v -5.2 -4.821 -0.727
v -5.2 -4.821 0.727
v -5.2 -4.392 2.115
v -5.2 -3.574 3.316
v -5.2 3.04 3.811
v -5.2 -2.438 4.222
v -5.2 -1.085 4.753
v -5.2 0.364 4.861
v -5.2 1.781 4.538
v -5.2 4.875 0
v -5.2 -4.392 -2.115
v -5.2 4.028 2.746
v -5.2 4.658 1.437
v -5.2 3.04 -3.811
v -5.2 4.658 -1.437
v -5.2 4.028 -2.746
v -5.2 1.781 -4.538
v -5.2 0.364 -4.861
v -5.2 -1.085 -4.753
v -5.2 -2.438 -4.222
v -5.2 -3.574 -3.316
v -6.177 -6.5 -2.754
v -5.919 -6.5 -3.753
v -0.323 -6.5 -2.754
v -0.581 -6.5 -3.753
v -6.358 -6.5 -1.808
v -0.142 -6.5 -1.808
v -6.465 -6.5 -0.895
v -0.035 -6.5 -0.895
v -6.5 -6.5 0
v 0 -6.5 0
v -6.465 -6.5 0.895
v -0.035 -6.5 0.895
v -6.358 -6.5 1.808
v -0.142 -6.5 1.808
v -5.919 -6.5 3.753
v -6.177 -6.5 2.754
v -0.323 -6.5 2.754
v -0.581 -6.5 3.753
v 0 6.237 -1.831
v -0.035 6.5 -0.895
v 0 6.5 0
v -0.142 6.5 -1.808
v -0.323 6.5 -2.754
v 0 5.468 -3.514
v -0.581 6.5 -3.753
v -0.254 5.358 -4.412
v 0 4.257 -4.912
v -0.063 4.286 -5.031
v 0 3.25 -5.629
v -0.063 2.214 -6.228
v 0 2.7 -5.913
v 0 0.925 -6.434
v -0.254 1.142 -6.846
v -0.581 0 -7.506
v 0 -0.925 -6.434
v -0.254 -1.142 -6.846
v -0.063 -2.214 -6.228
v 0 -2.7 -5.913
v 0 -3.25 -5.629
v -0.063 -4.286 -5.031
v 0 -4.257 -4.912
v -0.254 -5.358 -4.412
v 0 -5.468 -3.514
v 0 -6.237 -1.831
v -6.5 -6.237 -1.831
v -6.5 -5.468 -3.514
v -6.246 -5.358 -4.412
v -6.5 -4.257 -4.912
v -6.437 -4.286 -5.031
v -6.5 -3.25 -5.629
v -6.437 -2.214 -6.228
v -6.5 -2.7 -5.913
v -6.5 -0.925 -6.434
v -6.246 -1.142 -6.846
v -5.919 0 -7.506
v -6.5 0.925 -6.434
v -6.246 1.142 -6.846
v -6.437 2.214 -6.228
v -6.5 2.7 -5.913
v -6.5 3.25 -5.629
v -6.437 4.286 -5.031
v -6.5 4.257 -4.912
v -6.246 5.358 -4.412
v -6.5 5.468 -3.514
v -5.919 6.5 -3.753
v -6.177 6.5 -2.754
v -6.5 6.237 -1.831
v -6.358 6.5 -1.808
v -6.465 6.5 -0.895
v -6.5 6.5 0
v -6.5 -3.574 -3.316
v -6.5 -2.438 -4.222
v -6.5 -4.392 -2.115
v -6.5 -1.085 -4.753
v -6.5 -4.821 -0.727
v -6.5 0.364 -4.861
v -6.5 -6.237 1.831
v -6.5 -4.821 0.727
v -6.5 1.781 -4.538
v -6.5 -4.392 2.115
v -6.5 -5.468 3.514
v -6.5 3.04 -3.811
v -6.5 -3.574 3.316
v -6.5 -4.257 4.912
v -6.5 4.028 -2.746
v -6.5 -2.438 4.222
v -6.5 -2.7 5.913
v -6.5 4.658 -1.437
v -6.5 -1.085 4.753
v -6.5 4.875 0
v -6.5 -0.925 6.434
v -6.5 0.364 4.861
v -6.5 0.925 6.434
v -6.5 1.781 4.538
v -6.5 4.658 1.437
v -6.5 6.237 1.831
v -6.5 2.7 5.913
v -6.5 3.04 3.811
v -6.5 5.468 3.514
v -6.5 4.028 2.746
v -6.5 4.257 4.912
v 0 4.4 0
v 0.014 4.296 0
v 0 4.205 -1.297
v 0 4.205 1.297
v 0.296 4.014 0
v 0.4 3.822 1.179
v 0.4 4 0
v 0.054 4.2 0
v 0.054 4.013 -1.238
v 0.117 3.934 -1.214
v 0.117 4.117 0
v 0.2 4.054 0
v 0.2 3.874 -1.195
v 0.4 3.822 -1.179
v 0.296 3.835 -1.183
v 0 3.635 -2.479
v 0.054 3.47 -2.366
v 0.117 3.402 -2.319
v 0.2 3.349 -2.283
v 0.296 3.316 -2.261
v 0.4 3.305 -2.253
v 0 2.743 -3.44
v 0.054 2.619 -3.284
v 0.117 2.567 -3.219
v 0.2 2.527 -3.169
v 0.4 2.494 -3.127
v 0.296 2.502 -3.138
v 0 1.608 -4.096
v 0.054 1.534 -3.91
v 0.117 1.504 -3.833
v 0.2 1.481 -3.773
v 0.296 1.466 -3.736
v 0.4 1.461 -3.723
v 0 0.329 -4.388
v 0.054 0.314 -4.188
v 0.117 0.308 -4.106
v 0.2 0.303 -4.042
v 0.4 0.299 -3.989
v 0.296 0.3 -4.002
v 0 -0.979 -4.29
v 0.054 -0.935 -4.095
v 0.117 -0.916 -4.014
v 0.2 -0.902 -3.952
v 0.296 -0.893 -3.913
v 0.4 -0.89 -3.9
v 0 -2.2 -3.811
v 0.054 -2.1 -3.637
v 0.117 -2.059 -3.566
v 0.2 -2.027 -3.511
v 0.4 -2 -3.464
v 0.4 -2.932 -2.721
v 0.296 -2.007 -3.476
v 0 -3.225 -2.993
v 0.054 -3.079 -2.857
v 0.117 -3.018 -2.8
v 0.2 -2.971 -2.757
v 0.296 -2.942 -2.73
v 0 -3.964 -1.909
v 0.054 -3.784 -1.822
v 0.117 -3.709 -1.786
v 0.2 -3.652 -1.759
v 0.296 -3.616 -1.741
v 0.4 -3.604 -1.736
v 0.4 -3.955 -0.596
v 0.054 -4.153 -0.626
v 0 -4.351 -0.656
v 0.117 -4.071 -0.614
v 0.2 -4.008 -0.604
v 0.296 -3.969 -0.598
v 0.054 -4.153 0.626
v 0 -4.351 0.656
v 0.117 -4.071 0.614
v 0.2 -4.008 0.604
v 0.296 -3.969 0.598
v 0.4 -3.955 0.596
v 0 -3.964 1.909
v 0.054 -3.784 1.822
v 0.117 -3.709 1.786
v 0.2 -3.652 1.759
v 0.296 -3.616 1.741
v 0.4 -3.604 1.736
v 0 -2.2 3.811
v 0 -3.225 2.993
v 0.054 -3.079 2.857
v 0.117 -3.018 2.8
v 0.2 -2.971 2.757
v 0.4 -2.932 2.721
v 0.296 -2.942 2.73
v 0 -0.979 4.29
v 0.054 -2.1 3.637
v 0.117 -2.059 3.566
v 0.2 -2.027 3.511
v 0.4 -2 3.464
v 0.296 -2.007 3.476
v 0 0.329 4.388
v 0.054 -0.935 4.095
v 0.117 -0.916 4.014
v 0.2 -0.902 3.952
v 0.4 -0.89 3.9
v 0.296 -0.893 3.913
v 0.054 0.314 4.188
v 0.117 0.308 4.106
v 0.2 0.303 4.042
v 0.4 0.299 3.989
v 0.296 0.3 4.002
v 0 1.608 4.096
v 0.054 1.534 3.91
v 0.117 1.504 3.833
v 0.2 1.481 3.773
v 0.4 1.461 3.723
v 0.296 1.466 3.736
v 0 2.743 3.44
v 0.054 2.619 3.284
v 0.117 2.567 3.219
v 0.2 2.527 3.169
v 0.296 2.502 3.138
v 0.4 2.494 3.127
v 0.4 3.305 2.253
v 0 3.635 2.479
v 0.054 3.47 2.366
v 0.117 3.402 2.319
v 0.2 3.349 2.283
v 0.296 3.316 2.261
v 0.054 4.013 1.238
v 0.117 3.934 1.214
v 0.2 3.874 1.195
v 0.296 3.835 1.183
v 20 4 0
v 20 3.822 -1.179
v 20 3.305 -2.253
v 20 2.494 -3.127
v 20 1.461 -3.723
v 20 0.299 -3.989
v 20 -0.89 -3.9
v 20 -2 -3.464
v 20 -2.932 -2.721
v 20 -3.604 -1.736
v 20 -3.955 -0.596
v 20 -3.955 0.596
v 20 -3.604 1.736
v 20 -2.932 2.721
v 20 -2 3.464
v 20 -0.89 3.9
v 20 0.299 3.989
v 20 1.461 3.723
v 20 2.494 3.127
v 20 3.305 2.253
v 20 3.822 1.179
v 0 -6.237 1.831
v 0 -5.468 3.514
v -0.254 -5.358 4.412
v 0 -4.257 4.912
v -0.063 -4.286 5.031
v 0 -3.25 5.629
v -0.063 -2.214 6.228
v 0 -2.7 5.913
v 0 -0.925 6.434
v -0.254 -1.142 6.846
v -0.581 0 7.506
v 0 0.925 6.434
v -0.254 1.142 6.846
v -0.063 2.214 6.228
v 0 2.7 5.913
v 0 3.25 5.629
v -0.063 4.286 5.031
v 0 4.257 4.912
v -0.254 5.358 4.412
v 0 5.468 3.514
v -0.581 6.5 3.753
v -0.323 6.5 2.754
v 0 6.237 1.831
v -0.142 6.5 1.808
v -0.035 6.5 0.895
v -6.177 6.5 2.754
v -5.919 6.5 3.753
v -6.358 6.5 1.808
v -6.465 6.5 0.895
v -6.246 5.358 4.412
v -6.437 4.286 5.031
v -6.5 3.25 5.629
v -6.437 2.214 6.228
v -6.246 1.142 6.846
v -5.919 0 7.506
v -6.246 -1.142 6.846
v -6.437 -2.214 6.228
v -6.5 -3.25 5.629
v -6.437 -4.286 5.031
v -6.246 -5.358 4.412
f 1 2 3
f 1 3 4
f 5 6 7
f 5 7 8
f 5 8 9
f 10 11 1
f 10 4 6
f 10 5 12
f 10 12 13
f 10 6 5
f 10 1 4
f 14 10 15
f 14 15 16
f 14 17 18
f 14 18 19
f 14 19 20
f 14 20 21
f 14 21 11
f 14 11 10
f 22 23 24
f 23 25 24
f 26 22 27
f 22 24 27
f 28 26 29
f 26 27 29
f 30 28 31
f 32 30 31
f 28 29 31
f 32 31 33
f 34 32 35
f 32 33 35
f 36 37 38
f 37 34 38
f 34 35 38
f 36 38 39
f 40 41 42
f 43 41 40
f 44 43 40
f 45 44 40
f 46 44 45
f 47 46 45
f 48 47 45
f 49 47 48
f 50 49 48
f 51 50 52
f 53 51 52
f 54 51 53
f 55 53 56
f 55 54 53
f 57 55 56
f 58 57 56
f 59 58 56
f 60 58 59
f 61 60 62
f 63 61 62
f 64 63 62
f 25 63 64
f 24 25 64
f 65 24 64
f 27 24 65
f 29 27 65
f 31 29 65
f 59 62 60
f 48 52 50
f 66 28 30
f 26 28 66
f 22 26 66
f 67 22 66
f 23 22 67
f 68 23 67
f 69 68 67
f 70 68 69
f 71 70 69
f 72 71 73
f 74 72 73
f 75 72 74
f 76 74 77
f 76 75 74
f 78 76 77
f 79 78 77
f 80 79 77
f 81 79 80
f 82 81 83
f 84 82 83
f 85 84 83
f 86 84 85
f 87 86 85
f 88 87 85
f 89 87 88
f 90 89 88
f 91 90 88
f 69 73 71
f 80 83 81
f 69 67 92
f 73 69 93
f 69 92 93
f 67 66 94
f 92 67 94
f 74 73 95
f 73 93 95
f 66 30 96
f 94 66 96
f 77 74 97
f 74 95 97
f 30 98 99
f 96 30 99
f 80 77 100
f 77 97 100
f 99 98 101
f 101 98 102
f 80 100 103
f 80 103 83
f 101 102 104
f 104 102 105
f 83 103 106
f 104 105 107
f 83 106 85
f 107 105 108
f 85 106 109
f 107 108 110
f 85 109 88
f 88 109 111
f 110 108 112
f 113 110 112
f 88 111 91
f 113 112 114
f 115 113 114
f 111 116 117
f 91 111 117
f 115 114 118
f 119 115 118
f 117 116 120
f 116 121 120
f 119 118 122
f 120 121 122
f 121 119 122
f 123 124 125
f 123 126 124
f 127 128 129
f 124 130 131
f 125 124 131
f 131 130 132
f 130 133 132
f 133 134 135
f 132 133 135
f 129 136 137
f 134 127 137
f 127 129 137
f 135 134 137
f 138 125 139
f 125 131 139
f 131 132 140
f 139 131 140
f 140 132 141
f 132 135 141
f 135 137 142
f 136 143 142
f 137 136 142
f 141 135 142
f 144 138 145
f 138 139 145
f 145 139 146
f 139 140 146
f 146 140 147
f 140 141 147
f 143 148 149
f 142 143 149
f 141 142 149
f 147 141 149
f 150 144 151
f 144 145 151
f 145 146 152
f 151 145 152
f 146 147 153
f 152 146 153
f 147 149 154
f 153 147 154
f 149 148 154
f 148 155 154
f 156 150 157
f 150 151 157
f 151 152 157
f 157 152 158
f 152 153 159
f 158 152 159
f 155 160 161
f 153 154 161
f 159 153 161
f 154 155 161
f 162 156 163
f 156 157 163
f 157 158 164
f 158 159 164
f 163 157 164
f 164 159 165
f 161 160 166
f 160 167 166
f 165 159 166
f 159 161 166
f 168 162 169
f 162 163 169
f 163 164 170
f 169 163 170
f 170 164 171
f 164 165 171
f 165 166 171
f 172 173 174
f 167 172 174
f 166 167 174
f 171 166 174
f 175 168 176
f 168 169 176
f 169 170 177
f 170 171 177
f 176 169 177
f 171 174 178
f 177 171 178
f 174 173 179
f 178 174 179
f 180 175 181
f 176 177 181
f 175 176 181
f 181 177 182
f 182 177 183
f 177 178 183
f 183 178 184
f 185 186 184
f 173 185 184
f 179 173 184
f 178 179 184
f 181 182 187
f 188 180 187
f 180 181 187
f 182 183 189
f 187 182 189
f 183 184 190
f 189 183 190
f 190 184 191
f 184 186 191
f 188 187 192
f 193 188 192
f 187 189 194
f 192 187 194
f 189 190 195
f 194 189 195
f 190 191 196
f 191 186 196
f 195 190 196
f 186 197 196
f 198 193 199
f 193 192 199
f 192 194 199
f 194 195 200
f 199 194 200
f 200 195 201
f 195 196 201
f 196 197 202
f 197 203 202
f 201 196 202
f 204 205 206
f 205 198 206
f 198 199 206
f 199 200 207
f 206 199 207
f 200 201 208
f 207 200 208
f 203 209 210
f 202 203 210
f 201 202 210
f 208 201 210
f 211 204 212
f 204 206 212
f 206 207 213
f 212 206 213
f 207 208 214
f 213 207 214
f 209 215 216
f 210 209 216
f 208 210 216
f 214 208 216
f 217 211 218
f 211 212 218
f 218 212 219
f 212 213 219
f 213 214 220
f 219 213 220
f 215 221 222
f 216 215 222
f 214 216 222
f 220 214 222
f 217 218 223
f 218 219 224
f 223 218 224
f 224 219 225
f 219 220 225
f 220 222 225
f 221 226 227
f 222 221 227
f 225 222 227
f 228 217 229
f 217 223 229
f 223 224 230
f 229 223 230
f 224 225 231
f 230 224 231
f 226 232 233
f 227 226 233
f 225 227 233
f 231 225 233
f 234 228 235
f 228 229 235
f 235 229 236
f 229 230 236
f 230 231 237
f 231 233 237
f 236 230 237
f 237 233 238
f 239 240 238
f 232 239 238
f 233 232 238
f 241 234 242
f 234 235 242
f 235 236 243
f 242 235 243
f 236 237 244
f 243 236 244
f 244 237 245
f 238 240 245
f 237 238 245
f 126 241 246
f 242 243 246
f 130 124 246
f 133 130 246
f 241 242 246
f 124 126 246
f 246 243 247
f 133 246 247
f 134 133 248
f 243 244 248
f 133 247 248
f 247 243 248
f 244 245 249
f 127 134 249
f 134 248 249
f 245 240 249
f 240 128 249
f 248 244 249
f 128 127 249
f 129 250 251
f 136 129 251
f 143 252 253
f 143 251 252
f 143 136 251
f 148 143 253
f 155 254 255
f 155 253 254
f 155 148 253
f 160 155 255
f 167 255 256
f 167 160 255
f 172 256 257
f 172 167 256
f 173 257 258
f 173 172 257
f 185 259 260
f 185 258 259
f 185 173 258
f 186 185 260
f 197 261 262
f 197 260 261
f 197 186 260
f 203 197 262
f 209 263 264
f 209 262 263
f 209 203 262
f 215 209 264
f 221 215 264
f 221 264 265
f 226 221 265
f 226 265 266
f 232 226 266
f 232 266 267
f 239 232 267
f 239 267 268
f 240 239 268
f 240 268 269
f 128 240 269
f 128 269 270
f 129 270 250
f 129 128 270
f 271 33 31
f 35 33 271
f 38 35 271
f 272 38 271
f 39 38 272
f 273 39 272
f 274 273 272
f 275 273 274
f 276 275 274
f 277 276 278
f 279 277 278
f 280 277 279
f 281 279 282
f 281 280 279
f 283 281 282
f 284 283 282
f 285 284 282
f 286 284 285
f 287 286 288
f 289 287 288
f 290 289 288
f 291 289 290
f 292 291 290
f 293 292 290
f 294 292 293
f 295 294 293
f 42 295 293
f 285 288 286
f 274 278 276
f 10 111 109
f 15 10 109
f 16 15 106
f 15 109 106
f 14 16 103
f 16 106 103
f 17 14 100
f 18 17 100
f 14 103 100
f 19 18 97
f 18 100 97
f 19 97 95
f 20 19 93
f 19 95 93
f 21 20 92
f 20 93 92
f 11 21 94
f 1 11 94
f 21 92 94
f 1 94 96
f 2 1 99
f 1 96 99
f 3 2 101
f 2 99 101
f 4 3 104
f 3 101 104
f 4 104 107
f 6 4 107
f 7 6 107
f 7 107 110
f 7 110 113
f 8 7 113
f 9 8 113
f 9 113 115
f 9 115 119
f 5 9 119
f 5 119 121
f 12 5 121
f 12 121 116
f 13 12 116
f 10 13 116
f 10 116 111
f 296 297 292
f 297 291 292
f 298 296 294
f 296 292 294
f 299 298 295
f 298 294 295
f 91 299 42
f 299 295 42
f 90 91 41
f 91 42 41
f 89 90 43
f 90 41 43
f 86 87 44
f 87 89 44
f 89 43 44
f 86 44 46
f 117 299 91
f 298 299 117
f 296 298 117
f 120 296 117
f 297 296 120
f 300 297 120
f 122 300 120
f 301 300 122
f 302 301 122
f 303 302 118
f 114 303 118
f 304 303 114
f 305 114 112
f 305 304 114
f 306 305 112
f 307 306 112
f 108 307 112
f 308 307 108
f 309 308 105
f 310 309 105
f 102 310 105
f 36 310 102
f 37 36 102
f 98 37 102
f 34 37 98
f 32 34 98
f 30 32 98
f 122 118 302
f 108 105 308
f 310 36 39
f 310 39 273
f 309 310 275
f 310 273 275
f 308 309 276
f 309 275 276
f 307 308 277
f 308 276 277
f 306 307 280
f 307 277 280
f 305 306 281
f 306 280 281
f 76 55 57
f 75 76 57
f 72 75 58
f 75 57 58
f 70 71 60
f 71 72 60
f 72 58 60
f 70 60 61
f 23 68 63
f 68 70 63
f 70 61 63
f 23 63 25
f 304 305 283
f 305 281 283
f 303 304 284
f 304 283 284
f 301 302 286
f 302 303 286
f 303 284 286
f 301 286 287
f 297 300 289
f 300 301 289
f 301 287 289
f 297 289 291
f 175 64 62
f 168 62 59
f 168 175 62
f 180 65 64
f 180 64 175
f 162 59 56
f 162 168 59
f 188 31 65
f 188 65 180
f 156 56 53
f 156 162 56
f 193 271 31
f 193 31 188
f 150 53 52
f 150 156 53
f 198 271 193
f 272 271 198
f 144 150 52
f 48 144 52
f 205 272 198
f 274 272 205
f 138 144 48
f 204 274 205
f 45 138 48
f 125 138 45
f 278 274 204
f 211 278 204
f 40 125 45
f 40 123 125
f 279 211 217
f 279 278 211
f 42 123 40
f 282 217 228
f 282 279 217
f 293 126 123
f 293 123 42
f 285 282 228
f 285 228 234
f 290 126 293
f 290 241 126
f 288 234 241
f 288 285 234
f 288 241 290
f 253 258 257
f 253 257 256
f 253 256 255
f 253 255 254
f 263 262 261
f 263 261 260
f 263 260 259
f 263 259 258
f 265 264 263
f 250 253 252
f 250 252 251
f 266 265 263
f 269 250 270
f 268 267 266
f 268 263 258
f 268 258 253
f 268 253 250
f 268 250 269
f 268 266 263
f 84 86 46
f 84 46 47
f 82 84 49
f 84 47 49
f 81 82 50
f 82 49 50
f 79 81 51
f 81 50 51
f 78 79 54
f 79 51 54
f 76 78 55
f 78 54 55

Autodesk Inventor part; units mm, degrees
ref_plane "YZ Plane" through (0, 0, 0) normal (1, 0, 0) x (0, 1, 0)
ref_plane "XZ Plane" through (0, 0, 0) normal (0, 1, 0) x (-1, 0, 0)
sketch "Sketch1" plane through (0, 0, 0) normal (0, 0, 1) x (1, 0, 0)
  line L0 (0, 4) -> (0, 0)
  line L1 (0, 0) -> (20, 0)
  line L2 (20, 0) -> (20, 4)
  line L3 (20, 4) -> (0, 4)
  line L4 (-4, 0) -> (24, 0) projected
  line L5 (0, -0.8) -> (0, 4.8) projected
  dimension "d0" = 8
  dimension "d1" = 20
revolve "Body" add sketch "Sketch1" angle 360 about axis through (0, 0, 0) along (1, 0, 0)
sketch "Sketch2" plane through (0, 0, 0) normal (1, 0, 0) x (0, 1, 0)
  line L0 (0, 7.5056) -> (6.5, 3.7528)
  line L1 (6.5, 3.7528) -> (6.5, -3.7528)
  line L2 (6.5, -3.7528) -> (0, -7.5056)
  line L3 (0, -7.5056) -> (-6.5, -3.7528)
  line L4 (-6.5, -3.7528) -> (-6.5, 3.7528)
  line L5 (-6.5, 3.7528) -> (0, 7.5056)
  line L6 (-9.1, 0) -> (9.1, 0) projected
  line L7 (0, -10.5078) -> (0, 10.5078) projected
  point P0 (0, 0)
  point P1 (0, 0)
  dimension "d2" = 13
extrude "Head" add sketch "Sketch2" against normal blind 6.5
sketch "Sketch3" plane through (-6.5, 0, 0) normal (-1, 0, 0) x (0, 1, 0)
  circle A0 centre (0, 0) radius 4.875
  point P0 (0, 0)
  dimension "d12" = 9.75
extrude "Indent1" cut sketch "Sketch3" against normal blind 1.3
sketch "Sketch4" plane through (0, 0, 0) normal (0, 0, 1) x (1, 0, 0)
  line L0 (-6.5, 7.5056) -> (-6.5, 6.5)
  line L1 (-6.5, 6.5) -> (-5.9194, 7.5056)
  line L2 (-5.9194, 7.5056) -> (-6.5, 7.5056)
  line L3 (0, 7.5056) -> (0, 6.5)
  line L4 (0, 6.5) -> (-0.5806, 7.5056)
  line L5 (-0.5806, 7.5056) -> (0, 7.5056)
  line L6 (0, 0) -> (-6.5, 0) projected
  line L7 (-6.5, 0) -> (-6.5, 6.5) projected
  line L8 (0, 0) -> (0, 6.5) projected
  line L9 (-7.8, 0) -> (1.3, 0) projected
  line L10 (-5.9194, 7.5056) -> (-0.5806, 7.5056) construction
  line L11 (0, -1.5011) -> (0, 9.0067) projected
  dimension "d6" = 30
  dimension "d7" = 30
  dimension "d16" = 13
  dimension "d17" = 13
  dimension "d18" = 15.0111
revolve "Chamfer1" cut sketch "Sketch4" angle 360 about axis through (-10, 0, 0) along (1, 0, 0)
fillet "Fillet1" radius 0.4 1 edges at (0, -4, 0)
thread "Thread" size "M8x1.25" class "6g" standard "ISO Metric profile" length 17.5
ref_plane "Work Plane1" through (3, 0, 0) normal (0, 0.5, 0.866) x (1, 0, 0)
equation "\"d0\" = GD"
equation "\"d1\" = NLG"
equation "\"d2\" = SW"
equation "\"d3\" = KOH"
equation "\"d12\" = 0.75 * SW0"
equation "\"d14\" = 0.2 * KOH"
equation "\"d6\" = ANG1"
equation "\"d7\" = ANG1"
equation "\"d16\" = SW0"
equation "\"d17\" = SW0"
equation "\"d18\" = 1.1547 * SW"
equation "\"d11\" = RR"
equation "\"d8\" = GEL"
equation "\"NLG\" = 20"
equation "\"KOH\" = 6.5"
equation "\"GD\" = NND"
equation "\"GEL\" = 17.5"
equation "\"SW\" = 13"
equation "\"SW0\" = SW"
equation "\"ANG1\" = 30deg"
equation "\"RR\" = 0.4"
equation "\"GUL\" = 0.61345 * PTC"
equation "\"SPD\" = NND - 1.2269 * PTC"
equation "\"GD1\" = THREADDIA - 1.2269 * PTC"
equation "\"THREADDIA\" = 8"
equation "\"SDH\" = 9.2"
equation "\"TOA\" = 30deg"
equation "\"BDM\" = NND"
equation "\"FAWI\" = 45deg"
equation "\"PTC\" = 1.25"
equation "\"NND\" = 8"
equation "\"GAL\" = 0.61345 * PTC"
equation "\"SD\" = 0"
equation "\"SD2\" = SDH"
equation "\"E0\" = 1.155 * SW"
properties part number "AS 1427 - M8 x 20" material "Steel, Mild"
